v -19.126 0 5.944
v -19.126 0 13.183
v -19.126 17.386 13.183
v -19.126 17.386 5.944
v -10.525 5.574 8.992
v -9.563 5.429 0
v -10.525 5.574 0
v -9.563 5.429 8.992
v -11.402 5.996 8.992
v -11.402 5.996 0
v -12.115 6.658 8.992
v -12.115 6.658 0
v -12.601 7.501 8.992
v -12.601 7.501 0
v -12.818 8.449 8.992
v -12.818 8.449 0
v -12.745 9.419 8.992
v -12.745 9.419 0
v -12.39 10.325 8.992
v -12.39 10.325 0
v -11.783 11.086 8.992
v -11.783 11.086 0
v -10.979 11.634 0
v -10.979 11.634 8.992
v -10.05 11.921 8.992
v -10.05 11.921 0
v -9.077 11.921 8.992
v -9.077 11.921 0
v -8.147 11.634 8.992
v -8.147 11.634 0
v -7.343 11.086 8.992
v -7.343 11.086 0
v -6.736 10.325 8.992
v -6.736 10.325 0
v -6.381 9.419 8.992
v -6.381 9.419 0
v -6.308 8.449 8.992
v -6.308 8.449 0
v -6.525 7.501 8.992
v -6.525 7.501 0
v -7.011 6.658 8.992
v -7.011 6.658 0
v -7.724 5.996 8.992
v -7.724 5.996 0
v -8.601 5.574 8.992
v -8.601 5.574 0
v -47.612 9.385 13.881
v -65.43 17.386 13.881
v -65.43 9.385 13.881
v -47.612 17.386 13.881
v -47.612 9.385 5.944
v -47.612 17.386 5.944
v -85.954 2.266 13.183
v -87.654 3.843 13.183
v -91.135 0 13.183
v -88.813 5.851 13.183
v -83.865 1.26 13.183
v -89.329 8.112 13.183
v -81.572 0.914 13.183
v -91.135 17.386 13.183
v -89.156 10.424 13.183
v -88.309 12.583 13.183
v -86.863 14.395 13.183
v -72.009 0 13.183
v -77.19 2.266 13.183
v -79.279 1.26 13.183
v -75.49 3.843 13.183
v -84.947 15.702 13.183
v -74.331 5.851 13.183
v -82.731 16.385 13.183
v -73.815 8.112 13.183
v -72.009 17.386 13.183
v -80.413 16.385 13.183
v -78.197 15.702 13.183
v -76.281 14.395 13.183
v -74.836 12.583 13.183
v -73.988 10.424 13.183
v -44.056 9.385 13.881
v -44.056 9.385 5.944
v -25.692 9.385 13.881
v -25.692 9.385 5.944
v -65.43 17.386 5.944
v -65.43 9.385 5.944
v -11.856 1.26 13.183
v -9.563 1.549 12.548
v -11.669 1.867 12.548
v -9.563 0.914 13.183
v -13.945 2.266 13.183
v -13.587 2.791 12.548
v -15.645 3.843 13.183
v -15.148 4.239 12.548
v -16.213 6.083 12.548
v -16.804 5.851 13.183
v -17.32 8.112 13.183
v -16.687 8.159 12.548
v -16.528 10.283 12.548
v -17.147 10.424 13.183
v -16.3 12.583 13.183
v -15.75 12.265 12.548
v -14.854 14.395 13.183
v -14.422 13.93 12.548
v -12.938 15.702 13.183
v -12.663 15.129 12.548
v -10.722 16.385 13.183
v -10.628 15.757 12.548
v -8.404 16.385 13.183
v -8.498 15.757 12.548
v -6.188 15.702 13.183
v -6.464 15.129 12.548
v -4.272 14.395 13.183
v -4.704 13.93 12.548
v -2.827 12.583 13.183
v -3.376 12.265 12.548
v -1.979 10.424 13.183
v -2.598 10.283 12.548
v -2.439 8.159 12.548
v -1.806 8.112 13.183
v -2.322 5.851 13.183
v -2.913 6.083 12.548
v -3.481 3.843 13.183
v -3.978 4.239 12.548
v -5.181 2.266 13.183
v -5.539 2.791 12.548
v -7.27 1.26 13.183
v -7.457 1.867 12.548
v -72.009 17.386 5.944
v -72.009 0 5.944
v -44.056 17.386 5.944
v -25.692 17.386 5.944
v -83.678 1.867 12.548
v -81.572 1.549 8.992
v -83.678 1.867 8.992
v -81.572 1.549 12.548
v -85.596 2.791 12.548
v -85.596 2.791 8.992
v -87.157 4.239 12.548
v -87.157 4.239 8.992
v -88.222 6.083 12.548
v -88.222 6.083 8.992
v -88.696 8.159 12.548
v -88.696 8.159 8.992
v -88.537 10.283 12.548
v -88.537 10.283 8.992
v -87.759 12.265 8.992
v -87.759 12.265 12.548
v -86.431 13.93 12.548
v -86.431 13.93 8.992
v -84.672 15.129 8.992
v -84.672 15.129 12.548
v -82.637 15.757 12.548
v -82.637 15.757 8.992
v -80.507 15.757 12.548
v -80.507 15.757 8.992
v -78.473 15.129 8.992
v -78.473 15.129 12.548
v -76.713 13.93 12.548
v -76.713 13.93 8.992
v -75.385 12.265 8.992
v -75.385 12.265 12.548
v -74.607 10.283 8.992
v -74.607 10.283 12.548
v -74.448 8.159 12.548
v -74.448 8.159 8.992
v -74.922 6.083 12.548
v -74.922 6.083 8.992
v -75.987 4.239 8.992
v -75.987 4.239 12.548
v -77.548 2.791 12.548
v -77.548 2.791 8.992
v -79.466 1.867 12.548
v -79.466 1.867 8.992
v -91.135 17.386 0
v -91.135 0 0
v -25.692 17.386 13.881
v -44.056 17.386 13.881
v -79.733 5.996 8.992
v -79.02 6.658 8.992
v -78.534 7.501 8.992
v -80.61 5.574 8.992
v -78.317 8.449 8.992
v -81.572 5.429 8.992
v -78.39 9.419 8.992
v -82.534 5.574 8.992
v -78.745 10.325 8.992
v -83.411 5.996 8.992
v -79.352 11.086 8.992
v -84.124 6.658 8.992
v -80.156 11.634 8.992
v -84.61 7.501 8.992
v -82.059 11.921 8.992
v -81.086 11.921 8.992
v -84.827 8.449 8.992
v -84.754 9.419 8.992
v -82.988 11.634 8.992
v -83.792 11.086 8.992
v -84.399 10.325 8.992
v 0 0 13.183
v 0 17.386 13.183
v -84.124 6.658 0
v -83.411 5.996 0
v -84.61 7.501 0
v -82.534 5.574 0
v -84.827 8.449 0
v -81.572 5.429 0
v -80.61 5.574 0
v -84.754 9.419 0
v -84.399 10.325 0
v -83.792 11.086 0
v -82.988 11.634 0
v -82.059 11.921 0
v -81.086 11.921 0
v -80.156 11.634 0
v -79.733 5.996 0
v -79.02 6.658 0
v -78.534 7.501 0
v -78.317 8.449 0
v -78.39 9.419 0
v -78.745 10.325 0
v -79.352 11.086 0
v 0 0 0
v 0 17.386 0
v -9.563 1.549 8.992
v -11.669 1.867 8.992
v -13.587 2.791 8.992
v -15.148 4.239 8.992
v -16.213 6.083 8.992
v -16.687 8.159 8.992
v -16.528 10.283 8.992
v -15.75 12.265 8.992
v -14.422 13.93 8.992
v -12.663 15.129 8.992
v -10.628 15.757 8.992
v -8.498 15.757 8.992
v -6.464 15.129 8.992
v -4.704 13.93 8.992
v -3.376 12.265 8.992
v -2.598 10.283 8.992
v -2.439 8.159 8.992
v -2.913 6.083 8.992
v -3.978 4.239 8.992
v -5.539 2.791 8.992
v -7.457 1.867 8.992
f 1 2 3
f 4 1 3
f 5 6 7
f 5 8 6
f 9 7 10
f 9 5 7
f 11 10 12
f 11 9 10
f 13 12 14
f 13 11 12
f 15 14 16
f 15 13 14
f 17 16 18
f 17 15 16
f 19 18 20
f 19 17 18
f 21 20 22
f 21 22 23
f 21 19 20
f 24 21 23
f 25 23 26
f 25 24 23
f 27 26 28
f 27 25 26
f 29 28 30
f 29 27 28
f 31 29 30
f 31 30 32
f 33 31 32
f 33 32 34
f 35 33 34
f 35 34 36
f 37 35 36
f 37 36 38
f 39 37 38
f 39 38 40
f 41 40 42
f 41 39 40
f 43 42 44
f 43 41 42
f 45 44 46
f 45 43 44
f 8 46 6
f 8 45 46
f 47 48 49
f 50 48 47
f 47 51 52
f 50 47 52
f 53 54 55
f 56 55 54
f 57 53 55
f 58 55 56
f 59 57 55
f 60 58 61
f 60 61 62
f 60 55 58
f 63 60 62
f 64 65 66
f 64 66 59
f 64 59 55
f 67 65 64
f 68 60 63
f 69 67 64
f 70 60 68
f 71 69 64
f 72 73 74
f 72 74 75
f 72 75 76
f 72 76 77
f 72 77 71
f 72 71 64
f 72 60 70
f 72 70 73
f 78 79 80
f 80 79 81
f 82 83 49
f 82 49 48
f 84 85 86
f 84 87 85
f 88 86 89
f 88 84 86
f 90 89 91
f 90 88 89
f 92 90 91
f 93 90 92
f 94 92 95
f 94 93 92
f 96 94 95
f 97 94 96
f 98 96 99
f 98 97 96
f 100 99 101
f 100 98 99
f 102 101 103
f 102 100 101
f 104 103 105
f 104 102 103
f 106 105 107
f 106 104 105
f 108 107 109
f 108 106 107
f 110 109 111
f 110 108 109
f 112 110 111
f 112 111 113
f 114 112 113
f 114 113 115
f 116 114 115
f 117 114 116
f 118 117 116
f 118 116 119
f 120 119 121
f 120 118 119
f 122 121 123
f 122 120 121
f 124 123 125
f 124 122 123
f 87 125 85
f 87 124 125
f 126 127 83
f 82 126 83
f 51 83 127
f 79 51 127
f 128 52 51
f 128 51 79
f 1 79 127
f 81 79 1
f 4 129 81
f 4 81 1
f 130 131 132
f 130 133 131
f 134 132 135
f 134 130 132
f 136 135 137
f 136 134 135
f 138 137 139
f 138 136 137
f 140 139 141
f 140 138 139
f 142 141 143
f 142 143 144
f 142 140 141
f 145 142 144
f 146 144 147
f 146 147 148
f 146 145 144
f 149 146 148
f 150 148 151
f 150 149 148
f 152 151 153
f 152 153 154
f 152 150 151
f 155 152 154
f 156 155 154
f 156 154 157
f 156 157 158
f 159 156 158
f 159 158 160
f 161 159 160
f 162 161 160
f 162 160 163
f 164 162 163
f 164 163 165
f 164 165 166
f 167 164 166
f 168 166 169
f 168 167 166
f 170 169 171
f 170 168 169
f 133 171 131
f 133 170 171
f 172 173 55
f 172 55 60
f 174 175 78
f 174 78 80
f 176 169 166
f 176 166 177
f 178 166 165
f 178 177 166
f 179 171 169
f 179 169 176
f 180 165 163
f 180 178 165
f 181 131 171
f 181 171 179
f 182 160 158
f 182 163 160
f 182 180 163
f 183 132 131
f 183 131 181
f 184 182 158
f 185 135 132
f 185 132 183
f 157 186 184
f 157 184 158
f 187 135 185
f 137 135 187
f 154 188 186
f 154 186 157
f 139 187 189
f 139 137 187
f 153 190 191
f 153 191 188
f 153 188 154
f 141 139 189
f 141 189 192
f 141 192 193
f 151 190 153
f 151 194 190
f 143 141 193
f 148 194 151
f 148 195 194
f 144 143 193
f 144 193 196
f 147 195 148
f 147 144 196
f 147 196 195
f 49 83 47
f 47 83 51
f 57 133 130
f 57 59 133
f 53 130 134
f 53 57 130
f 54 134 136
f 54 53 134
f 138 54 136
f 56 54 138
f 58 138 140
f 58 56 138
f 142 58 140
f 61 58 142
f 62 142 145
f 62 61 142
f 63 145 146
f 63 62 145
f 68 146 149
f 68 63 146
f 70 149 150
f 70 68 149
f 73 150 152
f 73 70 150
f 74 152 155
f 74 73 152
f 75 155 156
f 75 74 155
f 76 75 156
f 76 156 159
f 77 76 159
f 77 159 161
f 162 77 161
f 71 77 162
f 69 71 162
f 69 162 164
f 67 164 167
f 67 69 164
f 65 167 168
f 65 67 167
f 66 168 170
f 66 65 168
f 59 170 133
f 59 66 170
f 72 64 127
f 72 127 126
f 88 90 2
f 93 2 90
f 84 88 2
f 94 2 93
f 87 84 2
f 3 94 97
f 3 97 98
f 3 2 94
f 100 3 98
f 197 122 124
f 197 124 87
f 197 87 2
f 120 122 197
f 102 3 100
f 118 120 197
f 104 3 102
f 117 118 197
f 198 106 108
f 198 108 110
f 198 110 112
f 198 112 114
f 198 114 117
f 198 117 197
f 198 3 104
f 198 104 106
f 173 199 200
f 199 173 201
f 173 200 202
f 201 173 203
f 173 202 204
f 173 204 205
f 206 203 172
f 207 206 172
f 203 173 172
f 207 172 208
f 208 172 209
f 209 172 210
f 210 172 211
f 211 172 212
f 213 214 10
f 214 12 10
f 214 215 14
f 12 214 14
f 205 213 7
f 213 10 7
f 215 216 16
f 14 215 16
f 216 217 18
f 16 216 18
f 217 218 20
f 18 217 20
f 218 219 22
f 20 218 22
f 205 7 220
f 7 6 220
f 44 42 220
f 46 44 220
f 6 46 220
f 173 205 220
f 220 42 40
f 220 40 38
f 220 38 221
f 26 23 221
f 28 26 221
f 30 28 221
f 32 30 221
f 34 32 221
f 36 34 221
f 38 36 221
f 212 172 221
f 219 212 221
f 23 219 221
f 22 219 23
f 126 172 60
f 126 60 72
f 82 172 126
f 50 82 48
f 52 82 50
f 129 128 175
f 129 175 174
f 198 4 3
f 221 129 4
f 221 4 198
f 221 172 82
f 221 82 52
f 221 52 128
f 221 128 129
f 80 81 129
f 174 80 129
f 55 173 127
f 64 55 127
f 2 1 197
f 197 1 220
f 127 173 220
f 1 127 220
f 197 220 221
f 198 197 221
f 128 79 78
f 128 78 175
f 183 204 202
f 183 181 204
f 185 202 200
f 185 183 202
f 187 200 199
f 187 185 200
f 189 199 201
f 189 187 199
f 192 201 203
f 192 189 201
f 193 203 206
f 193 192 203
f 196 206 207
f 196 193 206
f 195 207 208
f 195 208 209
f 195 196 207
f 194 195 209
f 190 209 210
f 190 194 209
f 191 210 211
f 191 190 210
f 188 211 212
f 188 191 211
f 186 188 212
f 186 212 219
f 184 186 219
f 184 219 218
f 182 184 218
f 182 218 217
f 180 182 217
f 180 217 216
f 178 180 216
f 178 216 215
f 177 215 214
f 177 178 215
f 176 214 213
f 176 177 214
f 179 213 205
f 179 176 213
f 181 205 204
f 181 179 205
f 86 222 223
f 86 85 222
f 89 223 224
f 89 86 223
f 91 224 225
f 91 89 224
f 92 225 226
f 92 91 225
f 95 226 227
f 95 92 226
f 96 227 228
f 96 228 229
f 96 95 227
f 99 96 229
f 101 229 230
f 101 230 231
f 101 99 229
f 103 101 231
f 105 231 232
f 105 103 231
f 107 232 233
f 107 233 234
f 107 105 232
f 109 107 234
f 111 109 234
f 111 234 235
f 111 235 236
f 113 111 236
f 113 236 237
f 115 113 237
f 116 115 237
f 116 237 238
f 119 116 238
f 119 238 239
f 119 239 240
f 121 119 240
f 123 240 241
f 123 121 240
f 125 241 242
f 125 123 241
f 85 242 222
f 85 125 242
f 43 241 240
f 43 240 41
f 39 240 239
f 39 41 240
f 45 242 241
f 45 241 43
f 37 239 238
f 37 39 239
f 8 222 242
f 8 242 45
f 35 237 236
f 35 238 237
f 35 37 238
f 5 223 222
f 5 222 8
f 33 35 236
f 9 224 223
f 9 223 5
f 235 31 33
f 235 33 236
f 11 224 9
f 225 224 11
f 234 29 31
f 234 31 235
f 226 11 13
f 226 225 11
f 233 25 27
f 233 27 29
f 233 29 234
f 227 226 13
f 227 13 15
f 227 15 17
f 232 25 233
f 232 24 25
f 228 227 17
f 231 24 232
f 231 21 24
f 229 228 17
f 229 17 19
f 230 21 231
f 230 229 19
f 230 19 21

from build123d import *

# Parameters (mm, degrees)
SKETCH1_W                                    = 91.1352
SKETCH1_H                                    = 17.3863
BOSS_EXTRUDE1_DEPTH                          = 13.1826
SKETCH2_W                                    = 52.8828
SKETCH2_H                                    = 17.3863
CUT_EXTRUDE1_DEPTH                           = 7.239
CBORE_FOR_1_4_BINDING_HEAD_MACHINE_S_2_COUNT = 2
CBORE_FOR_1_4_BINDING_HEAD_MACHINE_S_2_PITCH = 72.009
SKETCH7_W                                    = 17.8181
SKETCH7_H                                    = 8.001
SKETCH7_W_2                                  = 18.3642
BOSS_EXTRUDE2_DEPTH                          = 7.9375


with BuildPart() as part:
    # Sketch1 → Boss-Extrude1 (new body)
    with BuildSketch(Plane.XY):
        with Locations((-45.5676, 8.69315)):
            Rectangle(SKETCH1_W, SKETCH1_H)
    extrude(amount=BOSS_EXTRUDE1_DEPTH)

    # Sketch2 → Cut-Extrude1 (cut)
    with BuildSketch(Plane.XY.offset(13.1826)):
        with Locations((-45.5676, 8.69315)):
            Rectangle(SKETCH2_W, SKETCH2_H)
    extrude(amount=-CUT_EXTRUDE1_DEPTH, mode=Mode.SUBTRACT)

    # Sketch6 → CBORE for 1/4 Binding Head Machine Screw1 (revolve, cut)
    with BuildSketch(Plane(origin=(-81.5721, 8.69315, 13.1826), x_dir=(0, -1, 0), z_dir=(1, 0, 0))):
        Polygon((0, 0), (0, 13.1826), (3.2639, 13.1826), (3.2639, 4.191), (7.14375, 4.191), (7.14375, 0.635), (7.77875, 0), align=None)
    cbore_for_1_4_binding_head_machine_screw = revolve(axis=Axis((-81.5721, 8.69315, 19.5326), (0, 0, -1)), mode=Mode.SUBTRACT)

    # CBORE for 1_4 Binding Head Machine S 2: CBORE for 1/4 Binding Head Machine Screw1 ×2
    with Locations(*[(i * CBORE_FOR_1_4_BINDING_HEAD_MACHINE_S_2_PITCH, 0, 0) for i in range(1, CBORE_FOR_1_4_BINDING_HEAD_MACHINE_S_2_COUNT)]):
        add(cbore_for_1_4_binding_head_machine_screw, mode=Mode.SUBTRACT)

    # Sketch7 → Boss-Extrude2 (add)
    with BuildSketch(Plane.XY.offset(5.9436)):
        with Locations((-56.52135, 13.3858)):
            Rectangle(SKETCH7_W, SKETCH7_H)
        with Locations((-34.8742, 13.3858)):
            Rectangle(SKETCH7_W_2, SKETCH7_H)
    extrude(amount=BOSS_EXTRUDE2_DEPTH)


solid = part.part
